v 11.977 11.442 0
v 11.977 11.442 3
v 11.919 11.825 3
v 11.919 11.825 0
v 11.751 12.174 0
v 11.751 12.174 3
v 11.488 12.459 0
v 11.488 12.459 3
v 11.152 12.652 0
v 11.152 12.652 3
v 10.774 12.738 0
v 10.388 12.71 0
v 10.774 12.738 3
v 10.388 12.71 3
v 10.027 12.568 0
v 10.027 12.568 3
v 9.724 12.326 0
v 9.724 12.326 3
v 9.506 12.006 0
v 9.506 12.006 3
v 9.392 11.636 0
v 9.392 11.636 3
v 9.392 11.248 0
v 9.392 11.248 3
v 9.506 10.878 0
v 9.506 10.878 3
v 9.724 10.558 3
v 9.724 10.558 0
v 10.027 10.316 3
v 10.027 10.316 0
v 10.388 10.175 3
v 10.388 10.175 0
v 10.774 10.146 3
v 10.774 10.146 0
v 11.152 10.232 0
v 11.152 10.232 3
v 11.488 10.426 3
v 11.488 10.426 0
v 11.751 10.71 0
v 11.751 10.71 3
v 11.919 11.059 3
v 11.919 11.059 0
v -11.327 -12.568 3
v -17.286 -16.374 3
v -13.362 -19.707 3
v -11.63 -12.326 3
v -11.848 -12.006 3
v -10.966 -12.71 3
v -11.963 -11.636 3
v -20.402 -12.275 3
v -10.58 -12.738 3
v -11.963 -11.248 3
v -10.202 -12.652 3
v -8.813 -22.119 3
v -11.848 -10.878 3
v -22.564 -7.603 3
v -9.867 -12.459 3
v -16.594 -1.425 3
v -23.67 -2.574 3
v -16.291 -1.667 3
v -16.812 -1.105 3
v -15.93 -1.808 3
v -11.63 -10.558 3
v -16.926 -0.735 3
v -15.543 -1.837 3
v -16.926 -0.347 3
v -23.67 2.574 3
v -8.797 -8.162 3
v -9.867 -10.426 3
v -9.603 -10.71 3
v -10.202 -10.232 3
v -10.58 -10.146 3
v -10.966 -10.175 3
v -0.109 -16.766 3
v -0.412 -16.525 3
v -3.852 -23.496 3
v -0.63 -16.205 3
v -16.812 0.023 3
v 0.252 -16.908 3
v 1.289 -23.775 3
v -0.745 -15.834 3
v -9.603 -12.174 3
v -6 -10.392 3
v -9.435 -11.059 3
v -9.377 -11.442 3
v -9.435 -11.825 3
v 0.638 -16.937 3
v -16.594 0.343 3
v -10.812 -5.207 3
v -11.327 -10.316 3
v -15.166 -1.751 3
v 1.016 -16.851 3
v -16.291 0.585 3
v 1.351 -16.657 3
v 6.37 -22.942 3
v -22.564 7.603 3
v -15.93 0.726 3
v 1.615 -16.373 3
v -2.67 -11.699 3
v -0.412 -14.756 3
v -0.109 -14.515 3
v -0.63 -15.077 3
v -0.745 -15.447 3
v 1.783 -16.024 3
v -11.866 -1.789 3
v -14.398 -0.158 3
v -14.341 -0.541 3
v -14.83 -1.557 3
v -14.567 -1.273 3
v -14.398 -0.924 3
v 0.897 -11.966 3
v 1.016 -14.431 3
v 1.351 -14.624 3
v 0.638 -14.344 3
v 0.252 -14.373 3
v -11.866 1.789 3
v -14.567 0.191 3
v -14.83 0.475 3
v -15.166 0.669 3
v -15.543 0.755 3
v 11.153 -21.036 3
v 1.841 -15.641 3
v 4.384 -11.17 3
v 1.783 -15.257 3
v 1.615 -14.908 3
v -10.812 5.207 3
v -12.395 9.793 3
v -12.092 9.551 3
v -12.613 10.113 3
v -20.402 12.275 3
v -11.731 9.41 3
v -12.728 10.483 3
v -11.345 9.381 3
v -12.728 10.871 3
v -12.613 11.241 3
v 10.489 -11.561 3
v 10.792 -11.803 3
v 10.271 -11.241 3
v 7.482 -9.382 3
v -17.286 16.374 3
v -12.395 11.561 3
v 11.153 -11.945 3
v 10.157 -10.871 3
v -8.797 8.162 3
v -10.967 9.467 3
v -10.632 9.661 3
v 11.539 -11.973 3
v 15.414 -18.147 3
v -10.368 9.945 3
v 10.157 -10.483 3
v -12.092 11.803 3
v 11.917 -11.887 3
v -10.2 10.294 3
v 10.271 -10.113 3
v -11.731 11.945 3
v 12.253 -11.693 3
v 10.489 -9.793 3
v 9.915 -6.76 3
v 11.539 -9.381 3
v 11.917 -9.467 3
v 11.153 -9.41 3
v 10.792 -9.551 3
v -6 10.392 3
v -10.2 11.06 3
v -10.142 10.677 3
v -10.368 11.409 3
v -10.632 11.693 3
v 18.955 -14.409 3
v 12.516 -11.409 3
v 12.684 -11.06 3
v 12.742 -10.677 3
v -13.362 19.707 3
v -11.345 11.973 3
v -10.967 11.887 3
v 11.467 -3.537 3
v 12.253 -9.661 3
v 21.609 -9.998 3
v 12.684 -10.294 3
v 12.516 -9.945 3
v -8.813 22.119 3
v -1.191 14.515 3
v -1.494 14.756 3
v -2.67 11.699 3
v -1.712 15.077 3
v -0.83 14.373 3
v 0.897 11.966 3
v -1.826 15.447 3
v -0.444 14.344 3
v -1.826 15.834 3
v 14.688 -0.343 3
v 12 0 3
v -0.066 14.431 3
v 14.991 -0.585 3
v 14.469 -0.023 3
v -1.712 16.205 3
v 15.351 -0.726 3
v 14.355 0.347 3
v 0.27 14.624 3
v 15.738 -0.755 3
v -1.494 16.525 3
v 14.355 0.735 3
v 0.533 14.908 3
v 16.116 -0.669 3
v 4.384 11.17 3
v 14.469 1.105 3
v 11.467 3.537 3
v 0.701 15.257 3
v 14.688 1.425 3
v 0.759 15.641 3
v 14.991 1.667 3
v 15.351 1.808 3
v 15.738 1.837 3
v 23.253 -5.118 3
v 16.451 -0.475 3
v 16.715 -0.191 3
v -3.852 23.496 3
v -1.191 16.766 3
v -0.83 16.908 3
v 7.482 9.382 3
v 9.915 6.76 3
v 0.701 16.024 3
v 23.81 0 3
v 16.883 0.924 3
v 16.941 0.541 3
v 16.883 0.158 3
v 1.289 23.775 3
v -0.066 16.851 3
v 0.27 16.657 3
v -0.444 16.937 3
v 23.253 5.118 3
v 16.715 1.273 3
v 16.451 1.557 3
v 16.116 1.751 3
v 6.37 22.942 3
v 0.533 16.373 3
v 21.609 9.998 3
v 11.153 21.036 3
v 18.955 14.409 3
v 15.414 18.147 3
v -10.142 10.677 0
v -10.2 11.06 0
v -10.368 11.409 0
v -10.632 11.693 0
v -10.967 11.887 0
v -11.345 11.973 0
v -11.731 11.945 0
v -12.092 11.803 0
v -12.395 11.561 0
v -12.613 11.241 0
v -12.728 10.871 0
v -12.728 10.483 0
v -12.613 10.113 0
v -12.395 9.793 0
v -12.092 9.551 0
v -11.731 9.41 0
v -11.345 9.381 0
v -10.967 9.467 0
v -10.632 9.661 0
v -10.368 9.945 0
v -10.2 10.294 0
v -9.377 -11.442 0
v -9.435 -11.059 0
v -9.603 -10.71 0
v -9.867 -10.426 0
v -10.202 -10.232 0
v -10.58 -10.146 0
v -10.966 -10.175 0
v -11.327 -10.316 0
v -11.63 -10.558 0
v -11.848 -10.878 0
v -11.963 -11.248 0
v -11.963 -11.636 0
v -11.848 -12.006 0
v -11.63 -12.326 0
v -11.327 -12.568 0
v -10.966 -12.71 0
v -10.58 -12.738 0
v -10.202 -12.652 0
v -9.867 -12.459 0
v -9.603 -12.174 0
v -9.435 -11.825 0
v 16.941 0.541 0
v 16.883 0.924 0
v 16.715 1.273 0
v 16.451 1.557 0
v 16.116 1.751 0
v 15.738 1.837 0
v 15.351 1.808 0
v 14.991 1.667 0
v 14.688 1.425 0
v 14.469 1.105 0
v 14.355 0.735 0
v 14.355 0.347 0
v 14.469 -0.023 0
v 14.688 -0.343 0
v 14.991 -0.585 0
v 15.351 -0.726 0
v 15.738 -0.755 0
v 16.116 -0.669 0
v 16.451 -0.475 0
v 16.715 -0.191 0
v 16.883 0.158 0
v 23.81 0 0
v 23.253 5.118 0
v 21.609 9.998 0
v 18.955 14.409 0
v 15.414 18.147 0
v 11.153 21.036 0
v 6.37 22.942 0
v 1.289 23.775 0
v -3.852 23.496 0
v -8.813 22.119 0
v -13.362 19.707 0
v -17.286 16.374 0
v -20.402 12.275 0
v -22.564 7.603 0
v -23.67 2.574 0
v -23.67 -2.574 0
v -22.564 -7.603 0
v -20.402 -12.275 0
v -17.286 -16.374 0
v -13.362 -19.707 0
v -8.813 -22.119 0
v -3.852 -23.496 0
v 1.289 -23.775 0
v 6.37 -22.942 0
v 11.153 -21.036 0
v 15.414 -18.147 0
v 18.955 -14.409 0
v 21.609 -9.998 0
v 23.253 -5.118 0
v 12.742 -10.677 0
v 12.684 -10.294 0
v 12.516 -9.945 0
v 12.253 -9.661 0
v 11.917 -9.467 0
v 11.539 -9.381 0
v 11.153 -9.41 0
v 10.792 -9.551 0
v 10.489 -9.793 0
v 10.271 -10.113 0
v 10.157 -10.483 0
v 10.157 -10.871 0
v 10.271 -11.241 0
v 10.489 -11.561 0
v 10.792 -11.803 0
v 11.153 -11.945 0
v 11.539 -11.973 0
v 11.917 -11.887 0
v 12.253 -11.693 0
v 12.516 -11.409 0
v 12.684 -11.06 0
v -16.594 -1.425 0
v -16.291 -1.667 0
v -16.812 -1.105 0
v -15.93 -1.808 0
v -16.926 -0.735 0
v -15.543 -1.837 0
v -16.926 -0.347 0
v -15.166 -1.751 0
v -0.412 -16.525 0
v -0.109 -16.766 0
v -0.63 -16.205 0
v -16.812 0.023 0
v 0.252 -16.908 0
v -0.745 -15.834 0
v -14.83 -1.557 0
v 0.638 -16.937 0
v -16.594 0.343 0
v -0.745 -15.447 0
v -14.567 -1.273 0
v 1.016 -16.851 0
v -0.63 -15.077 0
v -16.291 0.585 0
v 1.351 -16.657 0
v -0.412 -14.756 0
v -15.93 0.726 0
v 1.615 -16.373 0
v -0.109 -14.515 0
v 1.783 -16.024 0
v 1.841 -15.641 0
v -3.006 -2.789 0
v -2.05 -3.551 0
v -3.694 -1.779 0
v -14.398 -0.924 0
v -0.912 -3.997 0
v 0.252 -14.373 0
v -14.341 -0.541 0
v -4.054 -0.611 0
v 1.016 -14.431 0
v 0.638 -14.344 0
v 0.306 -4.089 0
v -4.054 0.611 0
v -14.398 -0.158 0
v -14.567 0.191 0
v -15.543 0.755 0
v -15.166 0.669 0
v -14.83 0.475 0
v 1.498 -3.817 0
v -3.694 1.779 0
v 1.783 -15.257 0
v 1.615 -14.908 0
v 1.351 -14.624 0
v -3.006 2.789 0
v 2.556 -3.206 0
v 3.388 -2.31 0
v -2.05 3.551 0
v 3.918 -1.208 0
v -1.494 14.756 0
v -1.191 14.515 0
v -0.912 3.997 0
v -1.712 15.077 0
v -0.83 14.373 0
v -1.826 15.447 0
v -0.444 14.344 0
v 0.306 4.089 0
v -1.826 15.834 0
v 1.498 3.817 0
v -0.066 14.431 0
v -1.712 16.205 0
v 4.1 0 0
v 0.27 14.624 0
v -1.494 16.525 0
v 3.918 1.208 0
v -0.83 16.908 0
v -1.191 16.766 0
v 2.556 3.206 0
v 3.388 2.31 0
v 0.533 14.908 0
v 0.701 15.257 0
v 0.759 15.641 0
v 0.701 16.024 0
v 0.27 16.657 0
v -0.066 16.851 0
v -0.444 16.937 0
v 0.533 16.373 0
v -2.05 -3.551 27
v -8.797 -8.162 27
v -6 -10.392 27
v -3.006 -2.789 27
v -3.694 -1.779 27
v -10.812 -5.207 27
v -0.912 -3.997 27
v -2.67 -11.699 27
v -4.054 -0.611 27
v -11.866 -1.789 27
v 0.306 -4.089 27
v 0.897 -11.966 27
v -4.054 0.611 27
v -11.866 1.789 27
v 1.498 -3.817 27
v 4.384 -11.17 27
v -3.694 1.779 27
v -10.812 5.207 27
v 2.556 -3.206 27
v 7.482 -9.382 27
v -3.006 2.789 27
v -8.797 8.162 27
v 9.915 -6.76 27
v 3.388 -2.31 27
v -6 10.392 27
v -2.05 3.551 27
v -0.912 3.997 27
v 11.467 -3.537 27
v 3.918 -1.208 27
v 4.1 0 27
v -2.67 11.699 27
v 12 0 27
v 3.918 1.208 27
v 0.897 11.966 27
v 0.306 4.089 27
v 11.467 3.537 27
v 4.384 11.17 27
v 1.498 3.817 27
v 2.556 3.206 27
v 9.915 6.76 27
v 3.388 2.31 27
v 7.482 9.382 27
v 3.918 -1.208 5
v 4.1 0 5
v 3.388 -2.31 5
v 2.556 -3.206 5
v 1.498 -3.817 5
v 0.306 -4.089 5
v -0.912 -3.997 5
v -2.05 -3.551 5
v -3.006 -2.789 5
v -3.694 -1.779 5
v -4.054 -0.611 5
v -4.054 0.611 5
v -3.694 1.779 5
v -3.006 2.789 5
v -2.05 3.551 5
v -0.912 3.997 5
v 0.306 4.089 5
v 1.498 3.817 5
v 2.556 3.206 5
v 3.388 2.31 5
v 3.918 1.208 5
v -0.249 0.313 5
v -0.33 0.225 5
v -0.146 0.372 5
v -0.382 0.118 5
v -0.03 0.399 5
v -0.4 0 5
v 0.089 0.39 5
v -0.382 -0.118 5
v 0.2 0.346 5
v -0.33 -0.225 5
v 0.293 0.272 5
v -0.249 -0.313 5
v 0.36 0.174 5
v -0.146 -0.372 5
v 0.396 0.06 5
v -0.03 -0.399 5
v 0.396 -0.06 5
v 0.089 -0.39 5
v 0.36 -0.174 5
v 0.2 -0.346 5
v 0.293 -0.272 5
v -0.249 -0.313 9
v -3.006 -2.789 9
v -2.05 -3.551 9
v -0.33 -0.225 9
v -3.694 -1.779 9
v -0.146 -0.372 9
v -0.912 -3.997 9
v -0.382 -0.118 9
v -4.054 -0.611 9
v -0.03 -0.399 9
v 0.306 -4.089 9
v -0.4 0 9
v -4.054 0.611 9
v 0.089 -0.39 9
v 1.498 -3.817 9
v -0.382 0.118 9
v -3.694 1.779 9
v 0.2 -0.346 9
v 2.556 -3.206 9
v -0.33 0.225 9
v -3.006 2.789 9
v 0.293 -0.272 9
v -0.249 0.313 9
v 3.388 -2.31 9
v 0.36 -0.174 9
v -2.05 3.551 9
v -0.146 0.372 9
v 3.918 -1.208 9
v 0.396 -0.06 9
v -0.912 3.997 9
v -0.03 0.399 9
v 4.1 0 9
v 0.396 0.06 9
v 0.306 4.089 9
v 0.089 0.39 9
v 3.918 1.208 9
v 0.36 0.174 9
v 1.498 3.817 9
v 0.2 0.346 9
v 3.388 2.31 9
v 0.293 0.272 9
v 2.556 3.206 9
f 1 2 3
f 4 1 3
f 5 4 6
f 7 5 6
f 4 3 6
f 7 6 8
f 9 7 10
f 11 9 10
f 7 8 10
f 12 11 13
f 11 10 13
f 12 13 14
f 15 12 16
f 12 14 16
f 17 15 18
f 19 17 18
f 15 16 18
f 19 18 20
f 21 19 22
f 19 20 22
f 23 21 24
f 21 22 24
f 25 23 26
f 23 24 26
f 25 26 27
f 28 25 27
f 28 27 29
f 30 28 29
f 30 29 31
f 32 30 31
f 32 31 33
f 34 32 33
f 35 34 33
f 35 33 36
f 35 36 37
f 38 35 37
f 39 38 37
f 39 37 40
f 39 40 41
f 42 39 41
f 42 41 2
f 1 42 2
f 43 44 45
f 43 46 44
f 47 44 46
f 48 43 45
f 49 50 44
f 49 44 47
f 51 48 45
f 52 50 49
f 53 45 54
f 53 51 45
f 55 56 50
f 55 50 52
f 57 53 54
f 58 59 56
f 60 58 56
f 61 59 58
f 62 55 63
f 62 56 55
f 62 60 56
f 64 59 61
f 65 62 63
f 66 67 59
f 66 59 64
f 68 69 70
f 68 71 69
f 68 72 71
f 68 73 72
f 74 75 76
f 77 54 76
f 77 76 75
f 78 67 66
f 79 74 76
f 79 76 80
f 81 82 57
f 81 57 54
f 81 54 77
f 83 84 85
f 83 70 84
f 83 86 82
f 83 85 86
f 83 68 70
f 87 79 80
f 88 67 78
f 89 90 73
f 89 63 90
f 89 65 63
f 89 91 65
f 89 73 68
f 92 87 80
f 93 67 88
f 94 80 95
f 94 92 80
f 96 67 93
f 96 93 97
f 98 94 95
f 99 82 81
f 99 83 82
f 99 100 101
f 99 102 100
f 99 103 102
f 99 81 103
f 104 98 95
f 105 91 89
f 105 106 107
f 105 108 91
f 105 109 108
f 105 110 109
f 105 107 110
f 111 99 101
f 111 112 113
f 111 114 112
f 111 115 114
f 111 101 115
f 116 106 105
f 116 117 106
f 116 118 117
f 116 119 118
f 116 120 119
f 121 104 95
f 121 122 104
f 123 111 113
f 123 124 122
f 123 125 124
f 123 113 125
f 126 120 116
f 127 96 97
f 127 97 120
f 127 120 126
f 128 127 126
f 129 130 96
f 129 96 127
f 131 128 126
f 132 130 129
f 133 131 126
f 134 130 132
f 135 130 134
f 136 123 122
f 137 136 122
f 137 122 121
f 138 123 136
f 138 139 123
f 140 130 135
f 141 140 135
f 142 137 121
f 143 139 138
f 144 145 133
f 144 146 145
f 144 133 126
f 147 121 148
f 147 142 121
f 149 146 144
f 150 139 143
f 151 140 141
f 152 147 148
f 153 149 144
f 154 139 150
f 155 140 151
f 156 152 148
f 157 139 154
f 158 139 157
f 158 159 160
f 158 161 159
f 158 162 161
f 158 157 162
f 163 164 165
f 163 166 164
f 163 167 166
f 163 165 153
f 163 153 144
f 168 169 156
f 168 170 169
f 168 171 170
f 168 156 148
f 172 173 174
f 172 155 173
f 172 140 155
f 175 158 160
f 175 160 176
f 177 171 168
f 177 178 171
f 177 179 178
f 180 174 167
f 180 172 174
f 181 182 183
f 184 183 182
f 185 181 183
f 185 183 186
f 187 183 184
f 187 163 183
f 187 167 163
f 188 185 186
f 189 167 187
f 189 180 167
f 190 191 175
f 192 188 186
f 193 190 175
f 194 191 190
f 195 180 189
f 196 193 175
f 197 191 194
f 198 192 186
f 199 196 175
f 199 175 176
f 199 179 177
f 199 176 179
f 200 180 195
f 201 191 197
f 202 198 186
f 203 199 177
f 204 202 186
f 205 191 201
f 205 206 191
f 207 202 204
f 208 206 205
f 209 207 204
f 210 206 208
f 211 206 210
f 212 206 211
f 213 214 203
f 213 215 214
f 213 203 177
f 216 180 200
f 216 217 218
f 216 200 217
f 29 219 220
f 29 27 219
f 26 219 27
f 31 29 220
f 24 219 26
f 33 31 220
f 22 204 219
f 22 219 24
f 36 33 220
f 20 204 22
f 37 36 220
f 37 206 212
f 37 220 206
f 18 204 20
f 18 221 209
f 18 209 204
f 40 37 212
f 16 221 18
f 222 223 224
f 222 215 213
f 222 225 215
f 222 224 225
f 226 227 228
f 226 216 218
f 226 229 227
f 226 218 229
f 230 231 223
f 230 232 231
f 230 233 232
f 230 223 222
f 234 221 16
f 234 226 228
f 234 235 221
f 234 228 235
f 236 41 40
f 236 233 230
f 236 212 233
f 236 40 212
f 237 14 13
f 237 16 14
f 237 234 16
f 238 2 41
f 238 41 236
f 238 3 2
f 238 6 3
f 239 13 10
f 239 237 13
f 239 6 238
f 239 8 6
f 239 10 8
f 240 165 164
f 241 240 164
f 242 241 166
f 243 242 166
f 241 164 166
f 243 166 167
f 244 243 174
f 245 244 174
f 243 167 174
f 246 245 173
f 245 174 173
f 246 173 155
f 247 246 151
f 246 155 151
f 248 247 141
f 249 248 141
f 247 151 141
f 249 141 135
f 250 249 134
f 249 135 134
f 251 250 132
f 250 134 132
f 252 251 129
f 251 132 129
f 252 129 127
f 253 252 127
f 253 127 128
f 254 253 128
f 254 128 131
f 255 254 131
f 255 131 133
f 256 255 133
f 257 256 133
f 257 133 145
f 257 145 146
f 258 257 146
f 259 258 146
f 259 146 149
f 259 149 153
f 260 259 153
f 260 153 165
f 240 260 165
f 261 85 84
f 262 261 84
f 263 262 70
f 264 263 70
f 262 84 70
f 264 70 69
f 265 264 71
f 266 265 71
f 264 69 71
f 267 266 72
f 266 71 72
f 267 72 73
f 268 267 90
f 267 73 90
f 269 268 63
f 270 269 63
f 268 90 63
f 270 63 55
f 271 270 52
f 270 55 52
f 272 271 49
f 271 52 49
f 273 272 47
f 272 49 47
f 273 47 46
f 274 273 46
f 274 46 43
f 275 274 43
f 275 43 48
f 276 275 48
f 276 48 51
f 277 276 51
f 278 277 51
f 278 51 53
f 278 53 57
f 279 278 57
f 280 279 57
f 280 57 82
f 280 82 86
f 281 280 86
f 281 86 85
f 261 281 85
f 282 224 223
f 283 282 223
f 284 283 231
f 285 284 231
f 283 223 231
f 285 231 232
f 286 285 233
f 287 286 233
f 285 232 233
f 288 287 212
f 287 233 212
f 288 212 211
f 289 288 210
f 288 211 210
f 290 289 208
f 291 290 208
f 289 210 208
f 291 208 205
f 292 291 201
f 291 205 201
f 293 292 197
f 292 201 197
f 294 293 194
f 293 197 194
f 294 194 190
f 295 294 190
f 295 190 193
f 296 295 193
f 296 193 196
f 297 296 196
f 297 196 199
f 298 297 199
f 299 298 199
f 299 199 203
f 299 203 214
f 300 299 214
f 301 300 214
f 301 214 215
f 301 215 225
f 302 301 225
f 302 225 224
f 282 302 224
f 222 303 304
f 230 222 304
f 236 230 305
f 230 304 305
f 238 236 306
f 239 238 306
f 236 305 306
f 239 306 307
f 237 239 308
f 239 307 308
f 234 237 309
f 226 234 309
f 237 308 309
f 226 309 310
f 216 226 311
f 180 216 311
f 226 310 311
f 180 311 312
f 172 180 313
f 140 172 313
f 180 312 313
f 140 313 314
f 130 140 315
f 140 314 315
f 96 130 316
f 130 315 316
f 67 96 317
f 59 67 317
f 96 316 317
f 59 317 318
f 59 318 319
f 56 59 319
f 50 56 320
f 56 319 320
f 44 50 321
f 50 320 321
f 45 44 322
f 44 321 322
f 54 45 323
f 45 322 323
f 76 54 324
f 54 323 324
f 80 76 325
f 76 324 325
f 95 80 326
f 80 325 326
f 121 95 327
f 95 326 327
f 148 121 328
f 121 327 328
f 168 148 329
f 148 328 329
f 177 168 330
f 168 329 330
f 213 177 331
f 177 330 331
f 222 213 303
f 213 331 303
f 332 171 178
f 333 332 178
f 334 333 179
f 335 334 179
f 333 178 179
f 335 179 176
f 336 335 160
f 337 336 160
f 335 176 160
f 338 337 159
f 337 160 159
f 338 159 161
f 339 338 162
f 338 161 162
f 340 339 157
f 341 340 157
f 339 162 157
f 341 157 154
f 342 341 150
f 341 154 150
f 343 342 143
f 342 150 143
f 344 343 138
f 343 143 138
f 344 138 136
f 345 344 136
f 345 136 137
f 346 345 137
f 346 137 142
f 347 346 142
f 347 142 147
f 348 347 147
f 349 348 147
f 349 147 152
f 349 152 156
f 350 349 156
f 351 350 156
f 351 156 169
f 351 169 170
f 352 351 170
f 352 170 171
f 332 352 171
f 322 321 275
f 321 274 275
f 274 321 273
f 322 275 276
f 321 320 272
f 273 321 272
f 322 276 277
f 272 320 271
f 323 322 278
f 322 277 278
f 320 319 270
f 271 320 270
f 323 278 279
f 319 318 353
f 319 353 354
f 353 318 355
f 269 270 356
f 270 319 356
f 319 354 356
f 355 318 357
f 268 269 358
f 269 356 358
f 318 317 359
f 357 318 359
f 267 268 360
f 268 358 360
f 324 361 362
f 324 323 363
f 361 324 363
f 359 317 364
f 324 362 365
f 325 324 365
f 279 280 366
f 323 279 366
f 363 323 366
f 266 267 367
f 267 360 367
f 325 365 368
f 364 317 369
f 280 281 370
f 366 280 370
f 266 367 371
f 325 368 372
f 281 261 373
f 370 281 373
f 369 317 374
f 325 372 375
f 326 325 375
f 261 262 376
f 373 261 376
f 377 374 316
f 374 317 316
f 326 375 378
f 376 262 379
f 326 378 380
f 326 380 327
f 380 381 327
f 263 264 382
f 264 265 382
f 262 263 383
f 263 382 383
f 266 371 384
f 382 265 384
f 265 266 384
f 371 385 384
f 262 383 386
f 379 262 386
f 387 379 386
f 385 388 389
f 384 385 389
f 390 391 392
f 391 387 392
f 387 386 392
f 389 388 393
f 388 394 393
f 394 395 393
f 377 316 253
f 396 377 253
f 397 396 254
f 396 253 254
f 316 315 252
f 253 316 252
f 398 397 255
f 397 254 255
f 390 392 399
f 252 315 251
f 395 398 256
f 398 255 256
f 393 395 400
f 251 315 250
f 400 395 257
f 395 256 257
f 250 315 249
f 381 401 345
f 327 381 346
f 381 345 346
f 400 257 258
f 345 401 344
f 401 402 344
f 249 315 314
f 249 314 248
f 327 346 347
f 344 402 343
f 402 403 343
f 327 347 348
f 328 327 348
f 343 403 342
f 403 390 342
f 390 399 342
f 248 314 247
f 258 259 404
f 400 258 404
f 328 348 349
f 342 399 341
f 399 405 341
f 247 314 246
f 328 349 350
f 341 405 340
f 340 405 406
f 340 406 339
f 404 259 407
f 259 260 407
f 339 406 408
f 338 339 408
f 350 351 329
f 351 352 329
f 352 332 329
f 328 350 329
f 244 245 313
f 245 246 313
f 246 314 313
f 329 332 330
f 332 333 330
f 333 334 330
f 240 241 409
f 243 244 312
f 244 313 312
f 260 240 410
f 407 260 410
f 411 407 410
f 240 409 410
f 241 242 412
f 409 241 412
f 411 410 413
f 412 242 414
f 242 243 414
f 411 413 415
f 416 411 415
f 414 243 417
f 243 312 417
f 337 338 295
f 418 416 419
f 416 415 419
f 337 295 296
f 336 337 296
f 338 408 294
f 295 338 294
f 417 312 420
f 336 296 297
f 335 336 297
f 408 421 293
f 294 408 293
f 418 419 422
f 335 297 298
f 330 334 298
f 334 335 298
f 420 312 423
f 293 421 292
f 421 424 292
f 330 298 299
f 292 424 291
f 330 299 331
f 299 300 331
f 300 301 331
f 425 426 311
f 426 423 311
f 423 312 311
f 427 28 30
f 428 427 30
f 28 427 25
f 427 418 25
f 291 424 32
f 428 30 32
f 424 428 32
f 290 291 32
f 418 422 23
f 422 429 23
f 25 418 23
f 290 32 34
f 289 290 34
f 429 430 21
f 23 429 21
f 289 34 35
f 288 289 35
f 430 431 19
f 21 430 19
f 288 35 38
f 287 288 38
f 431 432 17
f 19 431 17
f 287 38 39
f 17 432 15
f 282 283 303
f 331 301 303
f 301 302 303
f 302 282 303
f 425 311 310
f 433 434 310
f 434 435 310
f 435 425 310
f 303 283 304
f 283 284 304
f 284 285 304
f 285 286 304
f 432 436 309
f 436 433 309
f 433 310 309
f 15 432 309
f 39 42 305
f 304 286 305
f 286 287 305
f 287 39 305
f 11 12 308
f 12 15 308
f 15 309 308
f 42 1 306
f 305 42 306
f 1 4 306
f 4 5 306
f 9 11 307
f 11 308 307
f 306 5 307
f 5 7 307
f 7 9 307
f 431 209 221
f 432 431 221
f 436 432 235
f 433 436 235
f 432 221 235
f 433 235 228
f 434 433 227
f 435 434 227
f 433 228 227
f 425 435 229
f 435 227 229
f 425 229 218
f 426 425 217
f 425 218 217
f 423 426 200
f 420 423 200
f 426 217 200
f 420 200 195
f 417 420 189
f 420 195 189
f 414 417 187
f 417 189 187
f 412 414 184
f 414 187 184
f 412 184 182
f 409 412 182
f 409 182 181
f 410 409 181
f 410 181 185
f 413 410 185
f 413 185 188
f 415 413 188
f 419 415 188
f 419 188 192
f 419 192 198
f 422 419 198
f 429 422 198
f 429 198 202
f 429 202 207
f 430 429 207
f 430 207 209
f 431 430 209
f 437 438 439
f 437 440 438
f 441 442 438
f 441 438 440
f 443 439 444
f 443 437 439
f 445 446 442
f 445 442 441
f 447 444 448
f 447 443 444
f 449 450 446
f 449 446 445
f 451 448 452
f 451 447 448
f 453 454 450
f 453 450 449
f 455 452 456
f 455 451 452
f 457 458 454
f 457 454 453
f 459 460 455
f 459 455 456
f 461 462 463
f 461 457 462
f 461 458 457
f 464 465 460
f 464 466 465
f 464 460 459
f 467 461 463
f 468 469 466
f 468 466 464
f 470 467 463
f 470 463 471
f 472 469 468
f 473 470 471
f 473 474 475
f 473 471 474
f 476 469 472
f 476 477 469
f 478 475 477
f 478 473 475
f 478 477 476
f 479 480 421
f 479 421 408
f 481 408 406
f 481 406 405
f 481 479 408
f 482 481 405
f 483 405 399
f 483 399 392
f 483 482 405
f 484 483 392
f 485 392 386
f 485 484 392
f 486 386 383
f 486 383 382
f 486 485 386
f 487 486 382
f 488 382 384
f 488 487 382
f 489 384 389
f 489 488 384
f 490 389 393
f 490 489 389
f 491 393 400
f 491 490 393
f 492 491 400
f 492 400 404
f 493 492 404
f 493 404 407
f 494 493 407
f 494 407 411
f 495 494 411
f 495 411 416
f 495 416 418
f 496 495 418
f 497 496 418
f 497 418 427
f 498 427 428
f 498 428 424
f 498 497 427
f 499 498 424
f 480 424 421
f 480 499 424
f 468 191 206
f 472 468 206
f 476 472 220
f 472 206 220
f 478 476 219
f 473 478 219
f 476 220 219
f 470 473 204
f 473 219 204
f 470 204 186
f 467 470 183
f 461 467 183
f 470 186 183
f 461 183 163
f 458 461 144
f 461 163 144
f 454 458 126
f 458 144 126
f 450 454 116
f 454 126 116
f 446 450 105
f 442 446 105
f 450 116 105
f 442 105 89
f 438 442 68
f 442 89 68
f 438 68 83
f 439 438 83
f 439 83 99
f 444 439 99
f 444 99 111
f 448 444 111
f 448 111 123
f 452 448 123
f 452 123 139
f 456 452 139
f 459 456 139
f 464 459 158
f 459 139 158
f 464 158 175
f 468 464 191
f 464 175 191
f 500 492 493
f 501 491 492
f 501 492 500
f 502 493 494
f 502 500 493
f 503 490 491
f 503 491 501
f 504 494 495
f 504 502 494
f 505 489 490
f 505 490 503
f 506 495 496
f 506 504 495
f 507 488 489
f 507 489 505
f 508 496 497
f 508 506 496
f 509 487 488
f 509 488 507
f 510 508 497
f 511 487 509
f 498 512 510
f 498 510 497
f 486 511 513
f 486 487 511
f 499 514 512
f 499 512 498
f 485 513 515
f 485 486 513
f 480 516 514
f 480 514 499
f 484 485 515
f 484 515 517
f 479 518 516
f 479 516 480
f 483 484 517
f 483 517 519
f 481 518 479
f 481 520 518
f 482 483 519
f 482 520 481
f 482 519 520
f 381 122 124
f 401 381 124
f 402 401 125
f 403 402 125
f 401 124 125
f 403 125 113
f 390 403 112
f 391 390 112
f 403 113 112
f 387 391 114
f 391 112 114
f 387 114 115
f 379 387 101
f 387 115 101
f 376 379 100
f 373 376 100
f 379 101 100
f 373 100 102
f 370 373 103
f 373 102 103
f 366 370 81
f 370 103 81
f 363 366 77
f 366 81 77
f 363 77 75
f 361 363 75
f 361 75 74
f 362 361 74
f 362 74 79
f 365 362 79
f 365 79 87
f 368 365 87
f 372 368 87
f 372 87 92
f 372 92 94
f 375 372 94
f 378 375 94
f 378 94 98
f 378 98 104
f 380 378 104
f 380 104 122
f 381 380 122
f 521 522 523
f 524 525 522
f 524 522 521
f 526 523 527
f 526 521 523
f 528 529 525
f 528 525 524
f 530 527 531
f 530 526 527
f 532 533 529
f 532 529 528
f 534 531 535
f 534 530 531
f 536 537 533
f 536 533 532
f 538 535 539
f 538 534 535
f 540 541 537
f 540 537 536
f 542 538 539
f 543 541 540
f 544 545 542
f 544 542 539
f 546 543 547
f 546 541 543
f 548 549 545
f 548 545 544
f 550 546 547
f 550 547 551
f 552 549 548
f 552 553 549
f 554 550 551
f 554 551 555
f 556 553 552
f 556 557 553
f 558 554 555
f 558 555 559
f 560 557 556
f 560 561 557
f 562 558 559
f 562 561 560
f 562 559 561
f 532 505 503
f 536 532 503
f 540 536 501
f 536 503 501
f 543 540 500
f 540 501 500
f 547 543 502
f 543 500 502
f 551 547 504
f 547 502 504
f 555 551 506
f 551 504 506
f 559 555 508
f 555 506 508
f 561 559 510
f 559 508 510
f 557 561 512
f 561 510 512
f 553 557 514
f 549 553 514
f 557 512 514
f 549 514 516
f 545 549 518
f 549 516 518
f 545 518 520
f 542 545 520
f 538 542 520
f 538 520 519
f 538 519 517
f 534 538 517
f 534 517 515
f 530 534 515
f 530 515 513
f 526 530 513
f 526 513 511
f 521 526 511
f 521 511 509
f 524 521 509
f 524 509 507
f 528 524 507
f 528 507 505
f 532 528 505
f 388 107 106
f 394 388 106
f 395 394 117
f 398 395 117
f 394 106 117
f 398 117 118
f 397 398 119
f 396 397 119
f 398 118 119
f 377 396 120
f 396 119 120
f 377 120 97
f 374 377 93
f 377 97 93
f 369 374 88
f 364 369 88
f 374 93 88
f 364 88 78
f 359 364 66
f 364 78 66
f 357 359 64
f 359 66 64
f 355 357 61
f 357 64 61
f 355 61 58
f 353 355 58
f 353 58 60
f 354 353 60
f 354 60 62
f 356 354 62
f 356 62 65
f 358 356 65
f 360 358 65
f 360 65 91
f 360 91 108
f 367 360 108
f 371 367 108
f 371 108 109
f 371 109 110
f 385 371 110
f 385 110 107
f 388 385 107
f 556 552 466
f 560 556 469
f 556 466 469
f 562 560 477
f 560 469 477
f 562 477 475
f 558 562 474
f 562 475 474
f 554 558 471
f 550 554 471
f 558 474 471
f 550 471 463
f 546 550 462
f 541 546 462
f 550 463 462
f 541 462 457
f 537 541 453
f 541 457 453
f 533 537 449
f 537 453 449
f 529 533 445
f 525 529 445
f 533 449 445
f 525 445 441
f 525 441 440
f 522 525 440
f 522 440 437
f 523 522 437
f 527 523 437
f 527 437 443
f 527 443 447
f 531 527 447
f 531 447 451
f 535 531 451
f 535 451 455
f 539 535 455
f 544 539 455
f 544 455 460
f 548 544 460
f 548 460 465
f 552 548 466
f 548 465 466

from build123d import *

# Parameters (mm, degrees)
ESQUISSE1_R             = 23.81
BOSS_EXTRU_1_DEPTH      = 3
ESQUISSE2_R             = 12
BOSS_EXTRU_2_DEPTH      = 24
ESQUISSE3_R             = 1.3
ENL_V_MAT_EXTRU_1_DEPTH = 24
ESQUISSE4_R             = 4.1
ENL_V_MAT_EXTRU_2_DEPTH = 18
ESQUISSE5_R             = 0.4
ENL_V_MAT_EXTRU_3_DEPTH = 10
ENL_V_START             = -5
ESQUISSE6_R             = 4.1
ENL_V_MAT_EXTRU_4_DEPTH = 5


with BuildPart() as part:
    # Esquisse1 → Boss.-Extru.1 (new body)
    with BuildSketch(Plane.XY):
        Circle(ESQUISSE1_R)
    extrude(amount=BOSS_EXTRU_1_DEPTH)

    # Esquisse2 → Boss.-Extru.2 (add)
    with BuildSketch(Plane.XY.offset(3)):
        Circle(ESQUISSE2_R)
    extrude(amount=BOSS_EXTRU_2_DEPTH)

    # Esquisse3 → Enlèv. mat.-Extru.1 (cut)
    with BuildSketch(Plane.XY.offset(3)):
        with Locations((-11.442120986, 10.677095455)):
            Circle(ESQUISSE3_R)
        with Locations((-0.540954741, 15.64064794)):
            Circle(ESQUISSE3_R)
        with Locations((10.677095455, 11.442120986)):
            Circle(ESQUISSE3_R)
        with Locations((15.64064794, 0.540954741)):
            Circle(ESQUISSE3_R)
        with Locations((11.442120986, -10.677095455)):
            Circle(ESQUISSE3_R)
        with Locations((0.540954741, -15.64064794)):
            Circle(ESQUISSE3_R)
        with Locations((-10.677095455, -11.442120986)):
            Circle(ESQUISSE3_R)
        with Locations((-15.64064794, -0.540954741)):
            Circle(ESQUISSE3_R)
    extrude(amount=-ENL_V_MAT_EXTRU_1_DEPTH, mode=Mode.SUBTRACT)

    # Esquisse4 → Enlèv. mat.-Extru.2 (cut)
    with BuildSketch(Plane.XY.offset(27)):
        Circle(ESQUISSE4_R)
    extrude(amount=-ENL_V_MAT_EXTRU_2_DEPTH, mode=Mode.SUBTRACT)

    # Esquisse5 → Enlèv. mat.-Extru.3 (cut)
    with BuildSketch(Plane(origin=(0, 0, 0), x_dir=(-1, 0, 0), z_dir=(0, 0, -1))):
        Circle(ESQUISSE5_R)
    extrude(amount=-ENL_V_MAT_EXTRU_3_DEPTH, mode=Mode.SUBTRACT)

    # Esquisse6 → Enlèv. mat.-Extru.4 (cut)
    with BuildSketch(Plane(origin=(0, 0, 0), x_dir=(-1, 0, 0), z_dir=(0, 0, -1)).offset(ENL_V_START)):
        Circle(ESQUISSE6_R)
    extrude(amount=ENL_V_MAT_EXTRU_4_DEPTH, mode=Mode.SUBTRACT)


solid = part.part
